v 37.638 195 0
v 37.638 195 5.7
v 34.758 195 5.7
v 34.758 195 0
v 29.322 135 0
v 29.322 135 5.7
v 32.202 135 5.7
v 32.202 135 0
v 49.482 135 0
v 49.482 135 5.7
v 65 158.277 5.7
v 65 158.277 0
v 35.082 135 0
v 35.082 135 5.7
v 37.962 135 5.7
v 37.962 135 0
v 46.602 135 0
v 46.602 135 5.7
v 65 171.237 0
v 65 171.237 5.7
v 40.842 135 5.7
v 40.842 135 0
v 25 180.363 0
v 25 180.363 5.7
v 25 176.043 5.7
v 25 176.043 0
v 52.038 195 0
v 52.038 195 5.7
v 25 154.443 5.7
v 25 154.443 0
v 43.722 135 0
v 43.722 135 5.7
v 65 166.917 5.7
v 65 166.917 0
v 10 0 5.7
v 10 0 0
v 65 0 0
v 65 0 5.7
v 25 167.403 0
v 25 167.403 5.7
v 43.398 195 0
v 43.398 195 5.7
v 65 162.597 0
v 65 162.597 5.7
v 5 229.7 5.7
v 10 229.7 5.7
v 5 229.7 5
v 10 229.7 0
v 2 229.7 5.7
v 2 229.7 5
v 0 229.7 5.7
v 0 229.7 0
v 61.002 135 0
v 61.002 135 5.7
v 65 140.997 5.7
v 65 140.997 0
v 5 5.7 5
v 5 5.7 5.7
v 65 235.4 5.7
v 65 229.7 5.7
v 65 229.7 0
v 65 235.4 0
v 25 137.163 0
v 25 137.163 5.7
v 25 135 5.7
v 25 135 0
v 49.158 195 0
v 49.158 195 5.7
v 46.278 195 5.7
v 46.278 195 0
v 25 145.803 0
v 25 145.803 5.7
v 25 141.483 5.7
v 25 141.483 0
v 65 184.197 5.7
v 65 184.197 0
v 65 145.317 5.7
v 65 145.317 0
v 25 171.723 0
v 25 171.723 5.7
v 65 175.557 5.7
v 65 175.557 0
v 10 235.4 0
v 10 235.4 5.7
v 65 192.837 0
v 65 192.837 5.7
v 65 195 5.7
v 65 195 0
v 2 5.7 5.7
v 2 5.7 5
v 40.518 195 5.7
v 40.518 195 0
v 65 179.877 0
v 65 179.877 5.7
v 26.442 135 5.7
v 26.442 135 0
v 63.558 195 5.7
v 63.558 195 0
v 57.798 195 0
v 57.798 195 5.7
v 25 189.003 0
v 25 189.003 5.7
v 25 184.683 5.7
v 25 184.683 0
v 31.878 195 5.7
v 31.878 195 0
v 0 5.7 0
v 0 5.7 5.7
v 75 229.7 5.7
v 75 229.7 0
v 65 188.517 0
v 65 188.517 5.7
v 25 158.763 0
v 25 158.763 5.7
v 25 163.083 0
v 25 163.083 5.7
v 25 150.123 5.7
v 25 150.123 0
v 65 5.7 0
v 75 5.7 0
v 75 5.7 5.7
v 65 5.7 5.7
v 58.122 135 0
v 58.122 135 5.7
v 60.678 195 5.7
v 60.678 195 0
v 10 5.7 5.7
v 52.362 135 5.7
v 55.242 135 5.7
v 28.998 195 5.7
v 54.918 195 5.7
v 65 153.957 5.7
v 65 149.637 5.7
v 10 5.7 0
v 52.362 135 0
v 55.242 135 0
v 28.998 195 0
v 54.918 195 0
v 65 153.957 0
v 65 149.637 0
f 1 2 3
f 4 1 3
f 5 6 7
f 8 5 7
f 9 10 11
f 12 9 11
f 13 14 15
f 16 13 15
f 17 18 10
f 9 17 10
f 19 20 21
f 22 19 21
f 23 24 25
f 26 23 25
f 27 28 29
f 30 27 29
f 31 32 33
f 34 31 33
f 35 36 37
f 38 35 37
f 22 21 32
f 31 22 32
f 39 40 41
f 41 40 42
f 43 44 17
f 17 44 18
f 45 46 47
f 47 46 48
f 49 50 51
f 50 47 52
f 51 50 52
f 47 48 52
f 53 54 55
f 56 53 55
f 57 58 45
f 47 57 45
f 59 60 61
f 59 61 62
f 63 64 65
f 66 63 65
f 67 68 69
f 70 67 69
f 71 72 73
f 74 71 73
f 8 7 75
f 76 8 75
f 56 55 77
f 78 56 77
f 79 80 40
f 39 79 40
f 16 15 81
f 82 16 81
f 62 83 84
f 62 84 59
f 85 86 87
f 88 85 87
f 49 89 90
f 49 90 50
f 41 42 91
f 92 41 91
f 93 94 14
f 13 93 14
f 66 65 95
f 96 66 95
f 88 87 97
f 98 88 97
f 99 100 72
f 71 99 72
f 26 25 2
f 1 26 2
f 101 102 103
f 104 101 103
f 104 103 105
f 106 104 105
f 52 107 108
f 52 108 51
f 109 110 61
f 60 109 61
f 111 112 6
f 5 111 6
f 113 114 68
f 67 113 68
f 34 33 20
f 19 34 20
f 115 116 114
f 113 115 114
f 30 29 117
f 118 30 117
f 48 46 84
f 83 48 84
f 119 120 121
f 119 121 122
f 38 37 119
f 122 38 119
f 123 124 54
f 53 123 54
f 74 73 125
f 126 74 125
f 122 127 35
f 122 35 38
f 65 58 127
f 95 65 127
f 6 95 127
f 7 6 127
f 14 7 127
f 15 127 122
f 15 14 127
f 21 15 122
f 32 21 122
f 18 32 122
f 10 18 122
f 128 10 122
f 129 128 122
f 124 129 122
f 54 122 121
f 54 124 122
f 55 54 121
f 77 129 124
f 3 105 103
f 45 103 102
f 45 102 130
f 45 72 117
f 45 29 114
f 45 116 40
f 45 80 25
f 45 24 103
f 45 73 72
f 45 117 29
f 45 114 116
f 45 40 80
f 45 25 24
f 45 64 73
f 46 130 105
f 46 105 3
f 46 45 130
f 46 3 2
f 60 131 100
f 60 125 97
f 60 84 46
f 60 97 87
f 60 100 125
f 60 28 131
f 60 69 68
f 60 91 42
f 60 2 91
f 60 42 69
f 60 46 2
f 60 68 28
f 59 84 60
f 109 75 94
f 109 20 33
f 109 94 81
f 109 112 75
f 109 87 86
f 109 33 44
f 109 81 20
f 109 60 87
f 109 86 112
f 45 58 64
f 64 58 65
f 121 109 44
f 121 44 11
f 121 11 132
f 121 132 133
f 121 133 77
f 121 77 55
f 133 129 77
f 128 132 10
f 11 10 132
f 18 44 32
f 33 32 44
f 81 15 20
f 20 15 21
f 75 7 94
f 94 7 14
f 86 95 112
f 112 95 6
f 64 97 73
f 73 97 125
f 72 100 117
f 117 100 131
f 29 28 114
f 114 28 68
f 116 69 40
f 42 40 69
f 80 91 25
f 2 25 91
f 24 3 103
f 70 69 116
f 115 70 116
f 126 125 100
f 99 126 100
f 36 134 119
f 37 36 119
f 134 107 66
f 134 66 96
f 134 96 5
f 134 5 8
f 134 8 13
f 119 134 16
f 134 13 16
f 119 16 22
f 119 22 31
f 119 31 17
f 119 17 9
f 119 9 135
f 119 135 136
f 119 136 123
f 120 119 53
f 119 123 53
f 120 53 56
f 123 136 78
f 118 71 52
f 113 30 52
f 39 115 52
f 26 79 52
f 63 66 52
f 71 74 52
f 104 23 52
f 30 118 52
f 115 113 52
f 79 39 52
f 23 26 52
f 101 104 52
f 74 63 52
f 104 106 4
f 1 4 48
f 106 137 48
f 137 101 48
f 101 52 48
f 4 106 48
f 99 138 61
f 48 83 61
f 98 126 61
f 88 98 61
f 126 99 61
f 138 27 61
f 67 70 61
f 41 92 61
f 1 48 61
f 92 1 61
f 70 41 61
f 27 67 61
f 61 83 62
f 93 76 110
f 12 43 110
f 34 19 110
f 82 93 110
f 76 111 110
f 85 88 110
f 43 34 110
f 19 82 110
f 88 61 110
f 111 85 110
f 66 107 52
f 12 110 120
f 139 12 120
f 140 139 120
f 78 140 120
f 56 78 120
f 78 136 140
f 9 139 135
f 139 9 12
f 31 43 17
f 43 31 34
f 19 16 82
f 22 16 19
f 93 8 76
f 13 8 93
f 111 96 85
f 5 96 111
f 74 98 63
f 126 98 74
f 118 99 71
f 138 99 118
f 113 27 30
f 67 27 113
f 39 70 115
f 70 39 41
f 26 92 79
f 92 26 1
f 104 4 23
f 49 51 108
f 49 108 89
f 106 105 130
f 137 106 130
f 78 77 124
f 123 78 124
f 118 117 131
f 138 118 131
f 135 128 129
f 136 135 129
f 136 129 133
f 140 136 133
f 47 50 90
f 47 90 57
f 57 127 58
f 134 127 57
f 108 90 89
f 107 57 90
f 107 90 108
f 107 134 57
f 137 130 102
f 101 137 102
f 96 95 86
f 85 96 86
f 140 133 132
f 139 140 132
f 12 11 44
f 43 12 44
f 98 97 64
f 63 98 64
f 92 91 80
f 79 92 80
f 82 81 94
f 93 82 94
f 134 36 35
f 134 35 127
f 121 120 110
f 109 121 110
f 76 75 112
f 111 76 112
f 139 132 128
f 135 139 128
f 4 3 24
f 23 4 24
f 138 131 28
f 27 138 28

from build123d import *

# Parameters (mm, degrees)
SKETCH1_W           = 75
SKETCH1_H           = 235.4
BOSS_EXTRUDE1_DEPTH = 5.7
SKETCH2_W           = 10
SKETCH2_H           = 5.7
CUT_EXTRUDE1_DEPTH  = 5.7
CUT_EXTRUDE2_DEPTH  = 5.7
SKETCH4_W           = 3
SKETCH4_H           = 224
CUT_EXTRUDE3_DEPTH  = 0.7


with BuildPart() as part:
    # Sketch1 → Boss-Extrude1 (new body)
    with BuildSketch(Plane.XY):
        with Locations((37.5, 117.7)):
            Rectangle(SKETCH1_W, SKETCH1_H)
    extrude(amount=BOSS_EXTRUDE1_DEPTH)

    # Sketch2 → Cut-Extrude1 (cut)
    with BuildSketch(Plane(origin=(0, 0, 0), x_dir=(-1, 0, 0), z_dir=(0, 0, -1))):
        with Locations((-70, 2.85)):
            Rectangle(SKETCH2_W, SKETCH2_H)
        with Locations((-5, 2.85)):
            Rectangle(SKETCH2_W, SKETCH2_H)
        with Locations((-5, 232.55)):
            Rectangle(SKETCH2_W, SKETCH2_H)
        with Locations((-70, 232.55)):
            Rectangle(SKETCH2_W, SKETCH2_H)
    extrude(amount=-CUT_EXTRUDE1_DEPTH, mode=Mode.SUBTRACT)

    # Sketch3 → Cut-Extrude2 (cut)
    with BuildSketch(Plane.XY.offset(5.7)):
        Polygon((65, 195), (63.55777949, 195), (25, 137.163330765), (25, 135), (26.44222051, 135), (65, 192.836669235), align=None)
        Polygon((60.67777949, 195), (57.79777949, 195), (25, 145.803330765), (25, 141.483330765), align=None)
        Polygon((54.91777949, 195), (52.03777949, 195), (25, 154.443330765), (25, 150.123330765), align=None)
        Polygon((49.15777949, 195), (46.27777949, 195), (25, 163.083330765), (25, 158.763330765), align=None)
        Polygon((43.39777949, 195), (40.51777949, 195), (25, 171.723330765), (25, 167.403330765), align=None)
        Polygon((37.63777949, 195), (34.75777949, 195), (25, 180.363330765), (25, 176.043330765), align=None)
        Polygon((31.87777949, 195), (28.99777949, 195), (25, 189.003330765), (25, 184.683330765), align=None)
        Polygon((65, 184.196669235), (65, 188.516669235), (29.32222051, 135), (32.20222051, 135), align=None)
        Polygon((65, 175.556669235), (65, 179.876669235), (35.08222051, 135), (37.96222051, 135), align=None)
        Polygon((65, 166.916669235), (65, 171.236669235), (40.84222051, 135), (43.72222051, 135), align=None)
        Polygon((65, 158.276669235), (65, 162.596669235), (46.60222051, 135), (49.48222051, 135), align=None)
        Polygon((65, 149.636669235), (65, 153.956669235), (52.36222051, 135), (55.24222051, 135), align=None)
        Polygon((65, 140.996669235), (65, 145.316669235), (58.12222051, 135), (61.00222051, 135), align=None)
    extrude(amount=-CUT_EXTRUDE2_DEPTH, mode=Mode.SUBTRACT)

    # Sketch4 → Cut-Extrude3 (cut)
    with BuildSketch(Plane.XY.offset(5.7)):
        with Locations((3.5, 117.7)):
            Rectangle(SKETCH4_W, SKETCH4_H)
    extrude(amount=-CUT_EXTRUDE3_DEPTH, mode=Mode.SUBTRACT)


solid = part.part
